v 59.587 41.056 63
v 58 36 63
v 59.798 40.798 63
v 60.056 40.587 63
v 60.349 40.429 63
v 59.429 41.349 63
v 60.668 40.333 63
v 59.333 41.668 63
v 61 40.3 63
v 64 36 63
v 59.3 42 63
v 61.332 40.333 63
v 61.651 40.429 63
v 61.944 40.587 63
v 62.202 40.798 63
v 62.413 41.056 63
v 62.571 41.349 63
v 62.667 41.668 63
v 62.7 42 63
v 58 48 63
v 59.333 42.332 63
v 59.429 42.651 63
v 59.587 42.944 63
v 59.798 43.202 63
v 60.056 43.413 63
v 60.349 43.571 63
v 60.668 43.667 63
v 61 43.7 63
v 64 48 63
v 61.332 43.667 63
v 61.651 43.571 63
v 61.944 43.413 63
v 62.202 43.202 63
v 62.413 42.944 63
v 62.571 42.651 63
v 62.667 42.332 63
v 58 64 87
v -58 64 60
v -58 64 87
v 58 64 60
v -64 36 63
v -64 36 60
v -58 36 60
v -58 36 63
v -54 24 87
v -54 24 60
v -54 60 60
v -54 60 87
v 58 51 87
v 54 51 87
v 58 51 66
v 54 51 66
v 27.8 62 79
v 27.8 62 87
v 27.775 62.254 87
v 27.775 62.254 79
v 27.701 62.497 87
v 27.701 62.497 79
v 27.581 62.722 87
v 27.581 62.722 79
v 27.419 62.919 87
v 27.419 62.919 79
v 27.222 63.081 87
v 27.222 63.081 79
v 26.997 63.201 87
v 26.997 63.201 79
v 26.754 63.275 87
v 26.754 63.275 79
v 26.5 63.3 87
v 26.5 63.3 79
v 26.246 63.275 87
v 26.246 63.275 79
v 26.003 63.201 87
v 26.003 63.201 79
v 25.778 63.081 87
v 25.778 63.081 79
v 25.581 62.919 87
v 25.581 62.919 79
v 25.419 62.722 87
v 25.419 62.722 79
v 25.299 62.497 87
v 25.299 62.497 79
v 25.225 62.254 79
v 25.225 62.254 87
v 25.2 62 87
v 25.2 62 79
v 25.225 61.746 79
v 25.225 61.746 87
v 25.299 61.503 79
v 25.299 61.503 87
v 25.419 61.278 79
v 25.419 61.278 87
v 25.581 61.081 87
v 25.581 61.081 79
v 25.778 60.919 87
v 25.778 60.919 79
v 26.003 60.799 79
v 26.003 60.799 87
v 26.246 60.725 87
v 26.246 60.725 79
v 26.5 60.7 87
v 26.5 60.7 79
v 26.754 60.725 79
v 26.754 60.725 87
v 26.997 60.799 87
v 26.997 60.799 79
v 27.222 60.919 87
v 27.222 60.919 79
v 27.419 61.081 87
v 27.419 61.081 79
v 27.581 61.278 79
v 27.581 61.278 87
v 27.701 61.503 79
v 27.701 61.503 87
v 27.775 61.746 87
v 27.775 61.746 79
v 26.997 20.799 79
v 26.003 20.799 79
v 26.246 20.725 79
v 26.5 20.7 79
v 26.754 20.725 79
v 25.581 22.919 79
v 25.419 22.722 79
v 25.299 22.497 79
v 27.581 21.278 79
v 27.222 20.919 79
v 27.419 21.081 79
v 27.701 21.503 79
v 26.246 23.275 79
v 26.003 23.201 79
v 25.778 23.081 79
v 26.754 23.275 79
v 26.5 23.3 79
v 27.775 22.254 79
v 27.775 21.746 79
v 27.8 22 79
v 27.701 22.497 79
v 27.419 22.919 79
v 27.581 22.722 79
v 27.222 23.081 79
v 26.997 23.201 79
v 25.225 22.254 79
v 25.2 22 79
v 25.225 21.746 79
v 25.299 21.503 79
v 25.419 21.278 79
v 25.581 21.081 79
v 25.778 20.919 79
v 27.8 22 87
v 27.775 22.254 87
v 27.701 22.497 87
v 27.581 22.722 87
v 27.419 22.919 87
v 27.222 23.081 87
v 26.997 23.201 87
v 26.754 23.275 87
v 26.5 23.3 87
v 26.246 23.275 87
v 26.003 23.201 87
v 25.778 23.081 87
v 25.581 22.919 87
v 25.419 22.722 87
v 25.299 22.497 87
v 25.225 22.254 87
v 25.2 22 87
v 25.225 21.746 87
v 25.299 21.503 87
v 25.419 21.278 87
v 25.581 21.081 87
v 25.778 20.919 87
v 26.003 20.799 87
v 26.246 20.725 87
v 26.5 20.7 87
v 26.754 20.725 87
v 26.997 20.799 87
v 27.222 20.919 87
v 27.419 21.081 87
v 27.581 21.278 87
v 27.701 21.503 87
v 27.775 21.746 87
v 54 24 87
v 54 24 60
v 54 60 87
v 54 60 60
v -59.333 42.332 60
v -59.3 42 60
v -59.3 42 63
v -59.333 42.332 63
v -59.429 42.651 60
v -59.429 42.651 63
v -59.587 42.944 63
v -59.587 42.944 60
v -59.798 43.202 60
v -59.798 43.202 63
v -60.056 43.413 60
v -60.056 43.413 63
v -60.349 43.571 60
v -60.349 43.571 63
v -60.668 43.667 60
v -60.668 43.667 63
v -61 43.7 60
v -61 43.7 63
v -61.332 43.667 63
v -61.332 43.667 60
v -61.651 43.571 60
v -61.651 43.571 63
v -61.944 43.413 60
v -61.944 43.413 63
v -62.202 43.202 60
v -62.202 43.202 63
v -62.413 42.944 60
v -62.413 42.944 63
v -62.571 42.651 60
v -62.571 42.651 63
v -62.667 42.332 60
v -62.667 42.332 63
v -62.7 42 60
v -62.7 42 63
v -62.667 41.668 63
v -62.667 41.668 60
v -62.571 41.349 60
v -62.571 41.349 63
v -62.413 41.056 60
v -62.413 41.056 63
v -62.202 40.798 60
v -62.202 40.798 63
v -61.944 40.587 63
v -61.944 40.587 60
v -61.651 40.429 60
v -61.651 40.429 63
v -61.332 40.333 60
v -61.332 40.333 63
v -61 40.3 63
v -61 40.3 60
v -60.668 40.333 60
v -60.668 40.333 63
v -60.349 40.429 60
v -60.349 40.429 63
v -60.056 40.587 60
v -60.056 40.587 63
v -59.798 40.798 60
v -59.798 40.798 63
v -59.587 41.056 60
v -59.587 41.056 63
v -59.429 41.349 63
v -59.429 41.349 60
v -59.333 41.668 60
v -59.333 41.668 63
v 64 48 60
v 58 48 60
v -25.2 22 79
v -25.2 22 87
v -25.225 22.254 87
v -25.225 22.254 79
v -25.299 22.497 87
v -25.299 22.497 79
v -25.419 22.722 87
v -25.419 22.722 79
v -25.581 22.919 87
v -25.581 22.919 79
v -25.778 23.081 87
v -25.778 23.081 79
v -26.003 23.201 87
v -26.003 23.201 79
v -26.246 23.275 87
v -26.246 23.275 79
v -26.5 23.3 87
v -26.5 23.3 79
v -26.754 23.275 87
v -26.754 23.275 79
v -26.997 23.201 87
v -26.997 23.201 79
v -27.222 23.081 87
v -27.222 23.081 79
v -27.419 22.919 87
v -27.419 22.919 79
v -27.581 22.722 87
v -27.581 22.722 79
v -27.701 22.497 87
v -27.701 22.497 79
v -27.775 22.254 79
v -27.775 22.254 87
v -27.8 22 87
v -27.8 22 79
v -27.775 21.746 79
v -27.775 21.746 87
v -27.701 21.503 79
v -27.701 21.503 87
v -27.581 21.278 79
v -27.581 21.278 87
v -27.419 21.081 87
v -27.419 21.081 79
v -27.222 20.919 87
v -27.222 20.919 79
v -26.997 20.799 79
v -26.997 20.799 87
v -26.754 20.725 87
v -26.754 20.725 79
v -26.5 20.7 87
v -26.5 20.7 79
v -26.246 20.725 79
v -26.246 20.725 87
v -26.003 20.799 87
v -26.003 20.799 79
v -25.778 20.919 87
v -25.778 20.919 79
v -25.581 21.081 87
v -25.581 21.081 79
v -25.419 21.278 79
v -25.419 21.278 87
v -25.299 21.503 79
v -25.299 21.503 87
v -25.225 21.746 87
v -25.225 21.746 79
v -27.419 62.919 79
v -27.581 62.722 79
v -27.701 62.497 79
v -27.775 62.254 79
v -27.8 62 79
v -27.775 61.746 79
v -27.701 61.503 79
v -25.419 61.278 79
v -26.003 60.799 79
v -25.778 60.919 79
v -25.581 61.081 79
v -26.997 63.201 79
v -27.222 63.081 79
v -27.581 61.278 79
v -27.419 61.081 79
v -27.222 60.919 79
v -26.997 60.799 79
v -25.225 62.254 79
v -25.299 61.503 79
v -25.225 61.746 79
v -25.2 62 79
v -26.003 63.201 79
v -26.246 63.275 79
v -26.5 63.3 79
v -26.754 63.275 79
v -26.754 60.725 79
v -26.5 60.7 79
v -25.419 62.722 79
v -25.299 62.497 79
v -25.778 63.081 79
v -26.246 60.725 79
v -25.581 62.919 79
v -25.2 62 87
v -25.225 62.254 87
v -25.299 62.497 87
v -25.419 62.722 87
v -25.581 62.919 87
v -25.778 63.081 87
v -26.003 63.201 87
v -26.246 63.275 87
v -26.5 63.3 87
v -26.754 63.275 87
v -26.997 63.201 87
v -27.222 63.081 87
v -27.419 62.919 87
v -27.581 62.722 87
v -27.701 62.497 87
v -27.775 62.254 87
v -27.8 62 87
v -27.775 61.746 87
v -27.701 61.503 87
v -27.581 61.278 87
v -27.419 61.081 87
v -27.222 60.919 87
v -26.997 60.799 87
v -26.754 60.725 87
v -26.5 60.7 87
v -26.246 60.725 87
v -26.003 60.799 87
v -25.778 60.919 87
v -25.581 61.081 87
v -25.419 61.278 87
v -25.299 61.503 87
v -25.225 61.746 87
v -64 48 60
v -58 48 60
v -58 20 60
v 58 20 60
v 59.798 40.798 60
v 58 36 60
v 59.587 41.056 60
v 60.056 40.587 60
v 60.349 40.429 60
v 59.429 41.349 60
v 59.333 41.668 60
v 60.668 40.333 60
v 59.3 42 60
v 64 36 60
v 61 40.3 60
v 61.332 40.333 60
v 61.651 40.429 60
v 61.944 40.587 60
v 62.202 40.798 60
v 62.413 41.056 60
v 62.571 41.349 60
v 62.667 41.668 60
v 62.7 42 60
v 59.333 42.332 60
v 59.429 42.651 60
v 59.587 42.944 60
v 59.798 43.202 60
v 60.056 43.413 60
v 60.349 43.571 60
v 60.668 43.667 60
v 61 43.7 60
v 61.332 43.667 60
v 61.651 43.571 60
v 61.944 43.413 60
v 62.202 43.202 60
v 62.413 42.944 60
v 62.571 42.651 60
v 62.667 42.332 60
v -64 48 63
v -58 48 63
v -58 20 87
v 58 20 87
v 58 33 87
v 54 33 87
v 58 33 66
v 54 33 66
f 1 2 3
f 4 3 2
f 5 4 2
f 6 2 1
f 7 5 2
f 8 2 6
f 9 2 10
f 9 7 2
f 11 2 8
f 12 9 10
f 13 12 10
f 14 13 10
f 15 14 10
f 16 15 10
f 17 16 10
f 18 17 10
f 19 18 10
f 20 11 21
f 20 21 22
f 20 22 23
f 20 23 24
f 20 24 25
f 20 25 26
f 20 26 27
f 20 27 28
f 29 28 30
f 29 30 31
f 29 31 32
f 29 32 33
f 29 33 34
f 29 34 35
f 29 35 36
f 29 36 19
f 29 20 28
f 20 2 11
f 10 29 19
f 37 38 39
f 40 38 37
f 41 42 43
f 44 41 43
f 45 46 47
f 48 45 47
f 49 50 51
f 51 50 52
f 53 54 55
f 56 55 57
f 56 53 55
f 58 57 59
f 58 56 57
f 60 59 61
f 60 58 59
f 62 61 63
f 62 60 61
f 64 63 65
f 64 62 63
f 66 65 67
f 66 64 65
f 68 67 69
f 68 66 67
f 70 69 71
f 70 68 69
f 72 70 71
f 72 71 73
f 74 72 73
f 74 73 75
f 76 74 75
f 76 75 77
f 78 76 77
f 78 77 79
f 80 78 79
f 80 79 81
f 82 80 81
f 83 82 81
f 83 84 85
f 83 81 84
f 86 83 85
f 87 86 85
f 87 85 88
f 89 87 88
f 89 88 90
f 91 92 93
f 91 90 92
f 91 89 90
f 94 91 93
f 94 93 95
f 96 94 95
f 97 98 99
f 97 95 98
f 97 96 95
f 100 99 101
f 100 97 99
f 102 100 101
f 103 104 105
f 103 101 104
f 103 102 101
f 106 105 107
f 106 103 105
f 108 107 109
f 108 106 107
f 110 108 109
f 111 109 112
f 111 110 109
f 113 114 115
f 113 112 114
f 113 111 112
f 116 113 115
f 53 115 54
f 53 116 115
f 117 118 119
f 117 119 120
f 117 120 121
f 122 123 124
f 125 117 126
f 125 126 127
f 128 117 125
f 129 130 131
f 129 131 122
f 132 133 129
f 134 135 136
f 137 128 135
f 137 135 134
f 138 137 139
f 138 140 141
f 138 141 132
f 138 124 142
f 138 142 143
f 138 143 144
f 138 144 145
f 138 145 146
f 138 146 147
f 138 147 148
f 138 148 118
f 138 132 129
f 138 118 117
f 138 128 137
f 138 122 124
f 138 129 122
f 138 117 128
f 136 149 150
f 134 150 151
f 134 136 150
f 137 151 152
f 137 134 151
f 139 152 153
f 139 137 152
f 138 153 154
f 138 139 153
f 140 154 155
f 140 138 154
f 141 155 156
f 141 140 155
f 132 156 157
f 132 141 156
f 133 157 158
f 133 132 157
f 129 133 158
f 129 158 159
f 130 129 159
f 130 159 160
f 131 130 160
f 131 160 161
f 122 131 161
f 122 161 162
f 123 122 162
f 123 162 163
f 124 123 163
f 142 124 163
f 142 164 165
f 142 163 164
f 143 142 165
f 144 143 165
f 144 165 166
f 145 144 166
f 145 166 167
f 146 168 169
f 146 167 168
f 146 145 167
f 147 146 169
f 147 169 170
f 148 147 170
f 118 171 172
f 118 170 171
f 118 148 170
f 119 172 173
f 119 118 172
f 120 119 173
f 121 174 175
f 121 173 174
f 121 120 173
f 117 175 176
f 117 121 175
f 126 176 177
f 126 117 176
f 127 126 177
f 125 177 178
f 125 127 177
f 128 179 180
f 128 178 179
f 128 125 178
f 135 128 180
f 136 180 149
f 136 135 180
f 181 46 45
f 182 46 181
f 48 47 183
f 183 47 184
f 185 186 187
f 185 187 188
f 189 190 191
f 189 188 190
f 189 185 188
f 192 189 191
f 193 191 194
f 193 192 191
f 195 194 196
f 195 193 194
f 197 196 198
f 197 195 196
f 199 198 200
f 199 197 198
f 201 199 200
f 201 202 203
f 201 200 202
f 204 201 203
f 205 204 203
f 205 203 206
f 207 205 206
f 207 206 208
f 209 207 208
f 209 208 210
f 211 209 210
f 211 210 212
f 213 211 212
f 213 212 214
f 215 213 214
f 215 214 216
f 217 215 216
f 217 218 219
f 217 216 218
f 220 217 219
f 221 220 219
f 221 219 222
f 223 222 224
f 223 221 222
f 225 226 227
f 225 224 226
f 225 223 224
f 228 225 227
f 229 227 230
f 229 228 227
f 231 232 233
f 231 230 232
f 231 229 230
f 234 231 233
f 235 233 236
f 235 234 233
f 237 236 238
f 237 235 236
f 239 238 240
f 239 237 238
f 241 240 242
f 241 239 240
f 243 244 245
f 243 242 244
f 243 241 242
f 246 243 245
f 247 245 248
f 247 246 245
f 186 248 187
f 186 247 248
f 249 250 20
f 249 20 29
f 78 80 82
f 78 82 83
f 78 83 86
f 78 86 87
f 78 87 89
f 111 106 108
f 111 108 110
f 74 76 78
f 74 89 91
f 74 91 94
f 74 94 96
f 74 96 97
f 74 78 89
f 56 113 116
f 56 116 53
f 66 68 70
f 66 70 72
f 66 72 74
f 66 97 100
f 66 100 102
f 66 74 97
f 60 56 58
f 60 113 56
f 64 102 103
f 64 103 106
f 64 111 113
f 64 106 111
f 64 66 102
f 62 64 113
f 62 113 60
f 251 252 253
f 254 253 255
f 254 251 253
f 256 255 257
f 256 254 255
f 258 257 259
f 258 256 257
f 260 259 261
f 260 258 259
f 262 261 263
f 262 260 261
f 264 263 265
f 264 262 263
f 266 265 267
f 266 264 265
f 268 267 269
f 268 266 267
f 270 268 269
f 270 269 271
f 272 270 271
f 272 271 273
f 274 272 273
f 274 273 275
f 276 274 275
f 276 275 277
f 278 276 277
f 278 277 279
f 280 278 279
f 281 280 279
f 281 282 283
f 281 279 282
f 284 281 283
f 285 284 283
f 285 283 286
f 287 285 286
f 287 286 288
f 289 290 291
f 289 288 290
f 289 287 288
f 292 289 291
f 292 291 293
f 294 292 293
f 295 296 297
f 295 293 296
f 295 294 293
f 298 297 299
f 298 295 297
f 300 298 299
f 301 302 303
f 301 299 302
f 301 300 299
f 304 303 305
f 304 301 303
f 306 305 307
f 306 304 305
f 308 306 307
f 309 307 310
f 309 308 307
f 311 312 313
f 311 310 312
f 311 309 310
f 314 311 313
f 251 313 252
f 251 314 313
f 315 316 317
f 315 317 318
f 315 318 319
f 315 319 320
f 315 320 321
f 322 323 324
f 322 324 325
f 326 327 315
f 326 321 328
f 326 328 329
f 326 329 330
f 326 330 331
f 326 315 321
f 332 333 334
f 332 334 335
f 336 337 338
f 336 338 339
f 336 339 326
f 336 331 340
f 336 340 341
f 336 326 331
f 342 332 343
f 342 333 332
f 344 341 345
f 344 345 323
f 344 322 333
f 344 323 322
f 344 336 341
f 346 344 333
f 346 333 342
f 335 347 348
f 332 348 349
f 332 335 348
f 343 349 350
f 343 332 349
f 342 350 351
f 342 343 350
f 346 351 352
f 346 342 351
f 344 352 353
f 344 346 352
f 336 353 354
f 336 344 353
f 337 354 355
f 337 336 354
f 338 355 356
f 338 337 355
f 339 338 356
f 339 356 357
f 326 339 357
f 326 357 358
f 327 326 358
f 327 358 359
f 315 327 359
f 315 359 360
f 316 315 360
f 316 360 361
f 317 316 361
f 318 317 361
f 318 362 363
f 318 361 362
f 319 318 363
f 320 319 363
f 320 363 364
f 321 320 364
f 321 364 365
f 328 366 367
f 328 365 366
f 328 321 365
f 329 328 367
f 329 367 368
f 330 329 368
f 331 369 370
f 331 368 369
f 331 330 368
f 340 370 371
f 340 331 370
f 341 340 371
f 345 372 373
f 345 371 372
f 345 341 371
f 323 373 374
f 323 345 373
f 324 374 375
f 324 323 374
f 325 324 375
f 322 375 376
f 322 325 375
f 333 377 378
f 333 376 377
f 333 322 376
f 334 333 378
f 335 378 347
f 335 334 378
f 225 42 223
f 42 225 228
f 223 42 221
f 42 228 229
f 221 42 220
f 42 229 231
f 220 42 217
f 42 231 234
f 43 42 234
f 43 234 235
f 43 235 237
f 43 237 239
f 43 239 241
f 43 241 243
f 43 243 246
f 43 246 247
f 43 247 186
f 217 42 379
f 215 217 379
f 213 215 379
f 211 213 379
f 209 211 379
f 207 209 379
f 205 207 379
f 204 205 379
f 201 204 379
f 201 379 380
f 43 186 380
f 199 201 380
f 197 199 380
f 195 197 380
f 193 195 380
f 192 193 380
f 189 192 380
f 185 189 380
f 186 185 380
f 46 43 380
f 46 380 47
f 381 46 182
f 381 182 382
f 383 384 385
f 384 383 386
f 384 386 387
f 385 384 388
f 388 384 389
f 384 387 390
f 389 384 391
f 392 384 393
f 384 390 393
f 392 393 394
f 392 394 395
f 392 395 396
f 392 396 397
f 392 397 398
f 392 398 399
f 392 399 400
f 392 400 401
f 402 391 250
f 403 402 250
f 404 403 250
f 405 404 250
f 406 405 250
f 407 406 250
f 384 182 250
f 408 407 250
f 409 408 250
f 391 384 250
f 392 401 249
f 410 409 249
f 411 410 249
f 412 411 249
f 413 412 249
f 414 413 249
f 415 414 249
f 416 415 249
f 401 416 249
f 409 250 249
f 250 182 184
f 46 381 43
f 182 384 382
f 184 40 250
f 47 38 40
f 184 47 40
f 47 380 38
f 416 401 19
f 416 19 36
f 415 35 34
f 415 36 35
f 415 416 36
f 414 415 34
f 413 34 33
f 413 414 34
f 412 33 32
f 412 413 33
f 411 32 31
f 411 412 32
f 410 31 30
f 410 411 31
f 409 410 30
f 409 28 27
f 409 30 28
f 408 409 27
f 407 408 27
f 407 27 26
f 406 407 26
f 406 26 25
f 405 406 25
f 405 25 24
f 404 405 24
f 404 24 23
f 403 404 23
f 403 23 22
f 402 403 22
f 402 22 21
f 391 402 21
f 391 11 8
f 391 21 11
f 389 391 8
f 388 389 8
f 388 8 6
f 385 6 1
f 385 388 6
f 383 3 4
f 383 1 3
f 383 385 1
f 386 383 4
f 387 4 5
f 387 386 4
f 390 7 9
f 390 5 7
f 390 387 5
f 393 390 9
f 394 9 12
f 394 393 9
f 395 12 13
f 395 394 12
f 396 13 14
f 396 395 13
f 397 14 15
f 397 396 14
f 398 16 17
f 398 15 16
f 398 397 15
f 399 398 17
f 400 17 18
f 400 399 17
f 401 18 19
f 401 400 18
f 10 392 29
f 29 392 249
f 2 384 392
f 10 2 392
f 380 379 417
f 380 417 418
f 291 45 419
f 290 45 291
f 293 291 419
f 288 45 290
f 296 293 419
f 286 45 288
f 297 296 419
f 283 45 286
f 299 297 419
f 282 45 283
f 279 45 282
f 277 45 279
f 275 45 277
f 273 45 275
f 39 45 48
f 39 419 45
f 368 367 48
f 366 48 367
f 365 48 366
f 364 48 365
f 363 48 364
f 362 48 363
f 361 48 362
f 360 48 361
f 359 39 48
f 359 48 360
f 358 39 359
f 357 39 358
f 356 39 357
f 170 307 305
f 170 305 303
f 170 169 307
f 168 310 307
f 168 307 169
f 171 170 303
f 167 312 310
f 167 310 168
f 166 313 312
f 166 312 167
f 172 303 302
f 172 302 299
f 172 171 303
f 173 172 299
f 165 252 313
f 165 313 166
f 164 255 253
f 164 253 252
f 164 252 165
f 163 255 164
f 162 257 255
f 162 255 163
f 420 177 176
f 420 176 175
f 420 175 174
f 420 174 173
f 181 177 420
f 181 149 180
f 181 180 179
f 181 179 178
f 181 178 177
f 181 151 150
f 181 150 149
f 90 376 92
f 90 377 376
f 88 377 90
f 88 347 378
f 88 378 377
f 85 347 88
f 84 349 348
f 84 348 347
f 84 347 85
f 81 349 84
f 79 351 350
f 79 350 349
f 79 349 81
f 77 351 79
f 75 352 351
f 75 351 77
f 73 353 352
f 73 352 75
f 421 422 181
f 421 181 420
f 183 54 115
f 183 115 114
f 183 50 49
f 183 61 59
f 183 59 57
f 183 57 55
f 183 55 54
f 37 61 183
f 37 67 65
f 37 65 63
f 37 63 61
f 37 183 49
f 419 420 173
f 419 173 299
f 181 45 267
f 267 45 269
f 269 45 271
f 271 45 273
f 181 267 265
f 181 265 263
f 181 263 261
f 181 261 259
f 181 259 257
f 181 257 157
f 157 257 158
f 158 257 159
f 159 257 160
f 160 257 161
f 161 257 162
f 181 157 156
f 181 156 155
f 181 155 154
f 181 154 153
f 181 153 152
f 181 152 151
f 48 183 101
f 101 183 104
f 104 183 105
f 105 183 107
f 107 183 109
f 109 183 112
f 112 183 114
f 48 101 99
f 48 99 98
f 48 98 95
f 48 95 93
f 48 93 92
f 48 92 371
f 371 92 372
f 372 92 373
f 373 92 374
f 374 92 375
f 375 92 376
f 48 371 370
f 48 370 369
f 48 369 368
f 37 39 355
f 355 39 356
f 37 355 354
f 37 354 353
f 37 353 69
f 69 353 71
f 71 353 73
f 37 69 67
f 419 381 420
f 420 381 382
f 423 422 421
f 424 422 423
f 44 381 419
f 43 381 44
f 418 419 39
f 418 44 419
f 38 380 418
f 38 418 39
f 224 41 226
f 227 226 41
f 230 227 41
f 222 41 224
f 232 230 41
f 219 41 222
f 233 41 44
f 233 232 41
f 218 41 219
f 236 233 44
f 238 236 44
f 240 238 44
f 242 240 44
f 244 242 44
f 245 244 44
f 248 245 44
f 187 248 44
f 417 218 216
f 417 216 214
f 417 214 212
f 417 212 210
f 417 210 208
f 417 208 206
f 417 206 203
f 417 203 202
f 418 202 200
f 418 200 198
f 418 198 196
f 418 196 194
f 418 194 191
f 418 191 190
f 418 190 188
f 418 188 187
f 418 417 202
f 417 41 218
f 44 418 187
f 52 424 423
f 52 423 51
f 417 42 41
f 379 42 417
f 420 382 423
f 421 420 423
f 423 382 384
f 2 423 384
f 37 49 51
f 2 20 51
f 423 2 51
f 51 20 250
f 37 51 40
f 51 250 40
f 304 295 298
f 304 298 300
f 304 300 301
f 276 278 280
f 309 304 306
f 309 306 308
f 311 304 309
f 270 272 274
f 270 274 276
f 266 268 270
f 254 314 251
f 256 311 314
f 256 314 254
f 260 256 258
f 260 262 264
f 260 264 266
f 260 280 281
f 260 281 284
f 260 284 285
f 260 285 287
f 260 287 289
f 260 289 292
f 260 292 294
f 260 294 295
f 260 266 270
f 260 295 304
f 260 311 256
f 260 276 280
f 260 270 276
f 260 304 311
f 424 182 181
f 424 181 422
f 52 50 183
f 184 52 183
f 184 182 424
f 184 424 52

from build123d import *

# Parameters (mm, degrees)
SKETCH1_W        = 116
SKETCH1_H        = 44
SKETCH1_W_2      = 108
SKETCH1_H_2      = 36
WALLS_DEPTH      = 27
SKETCH2_W        = 6
SKETCH2_H        = 12
FLOOR_TABS_DEPTH = 3
SKETCH3_R        = 1.7
TAB_HOLES_DEPTH  = 5
SKETCH4_W        = 10
SKETCH4_H        = 4
BAR_BOSSES_DEPTH = 8
SKETCH5_R        = 1.3
BAR_PILOTS_DEPTH = 9
SKETCH6_W        = 22
SKETCH6_H        = 18
LEAD_EXIT_DEPTH  = 6


with BuildPart() as part:
    # Sketch1 → Walls (new body)
    with BuildSketch(Plane.XY.offset(60)):
        with Locations((0, 42)):
            Rectangle(SKETCH1_W, SKETCH1_H)
        with Locations((0, 42)):
            Rectangle(SKETCH1_W_2, SKETCH1_H_2, mode=Mode.SUBTRACT)
    extrude(amount=WALLS_DEPTH)

    # Sketch2 → Floor_tabs (add)
    with BuildSketch(Plane.XY.offset(60)):
        with Locations((61, 42)):
            Rectangle(SKETCH2_W, SKETCH2_H)
        with Locations((-61, 42)):
            Rectangle(SKETCH2_W, SKETCH2_H)
    extrude(amount=FLOOR_TABS_DEPTH)

    # Sketch3 → Tab_holes (cut)
    with BuildSketch(Plane.XY.offset(59)):
        with Locations((61, 42)):
            Circle(SKETCH3_R)
        with Locations((-61, 42)):
            Circle(SKETCH3_R)
    extrude(amount=TAB_HOLES_DEPTH, mode=Mode.SUBTRACT)

    # Sketch4 → Bar_bosses (add)
    with BuildSketch(Plane.XY.offset(79)):
        with Locations((26.5, 62)):
            Rectangle(SKETCH4_W, SKETCH4_H)
        with Locations((-26.5, 62)):
            Rectangle(SKETCH4_W, SKETCH4_H)
        with Locations((26.5, 22)):
            Rectangle(SKETCH4_W, SKETCH4_H)
        with Locations((-26.5, 22)):
            Rectangle(SKETCH4_W, SKETCH4_H)
    extrude(amount=BAR_BOSSES_DEPTH)

    # Sketch5 → Bar_pilots (cut)
    with BuildSketch(Plane.XY.offset(79)):
        with Locations((26.5, 62)):
            Circle(SKETCH5_R)
        with Locations((26.5, 22)):
            Circle(SKETCH5_R)
        with Locations((-26.5, 62)):
            Circle(SKETCH5_R)
        with Locations((-26.5, 22)):
            Circle(SKETCH5_R)
    extrude(amount=BAR_PILOTS_DEPTH, mode=Mode.SUBTRACT)

    # Sketch6 → Lead_exit (cut)
    with BuildSketch(Plane(origin=(53, 0, 0), x_dir=(0, 0, -1), z_dir=(1, 0, 0))):
        with Locations((-77, 42)):
            Rectangle(SKETCH6_W, SKETCH6_H)
    extrude(amount=LEAD_EXIT_DEPTH, mode=Mode.SUBTRACT)


solid = part.part
